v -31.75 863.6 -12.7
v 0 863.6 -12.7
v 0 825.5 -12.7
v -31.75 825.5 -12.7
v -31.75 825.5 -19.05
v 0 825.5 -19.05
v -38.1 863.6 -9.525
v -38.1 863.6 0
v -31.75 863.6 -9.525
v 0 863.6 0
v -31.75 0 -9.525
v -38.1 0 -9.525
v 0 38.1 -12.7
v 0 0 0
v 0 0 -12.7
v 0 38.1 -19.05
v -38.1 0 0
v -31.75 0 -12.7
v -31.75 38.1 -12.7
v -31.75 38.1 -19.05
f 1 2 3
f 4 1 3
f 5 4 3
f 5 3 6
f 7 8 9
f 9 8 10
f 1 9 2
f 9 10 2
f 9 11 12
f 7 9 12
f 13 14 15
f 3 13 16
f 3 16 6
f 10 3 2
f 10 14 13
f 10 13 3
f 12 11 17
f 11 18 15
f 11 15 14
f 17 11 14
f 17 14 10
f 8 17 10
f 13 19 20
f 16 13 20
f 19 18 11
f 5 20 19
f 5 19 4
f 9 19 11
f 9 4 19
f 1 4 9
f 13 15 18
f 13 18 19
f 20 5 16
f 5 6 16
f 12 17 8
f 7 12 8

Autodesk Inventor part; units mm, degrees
ref_plane "YZ Plane" through (0, 0, 0) normal (1, 0, 0) x (0, 1, 0)
ref_plane "XZ Plane" through (0, 0, 0) normal (0, 1, 0) x (-1, 0, 0)
ref_plane "XY Plane" through (0, 0, 0) normal (0, 0, 1) x (1, 0, 0)
sketch "Sketch1" plane through (0, 0, 0) normal (1, 0, 0) x (0, 1, 0)
  line L0 (0, 0) -> (863.6, 0)
  line L1 (863.6, 0) -> (863.6, -19.05)
  line L2 (863.6, -19.05) -> (0, -19.05)
  line L3 (0, -19.05) -> (0, 0)
  dimension "d0" = 863.6
  dimension "d1" = 19.05
extrude "Extrusion1" add sketch "Sketch1" against normal blind 38.1
sketch "Sketch2" plane through (0, 0, 0) normal (1, 0, 0) x (0, 0, -1)
  line L0 (19.05, 0) -> (0, 0) projected
  line L1 (19.05, 0) -> (12.7, 0)
  line L2 (12.7, 0) -> (12.7, 38.1)
  line L3 (12.7, 38.1) -> (19.05, 38.1)
  line L4 (19.05, 38.1) -> (19.05, 0)
  point P0 (12.7, 0)
  dimension "d4" = 6.35
  dimension "d5" = 38.1
extrude "Extrusion2" cut sketch "Sketch2" against normal blind 38.1
sketch "Sketch3" plane through (0, 0, 0) normal (1, 0, 0) x (0, 0, -1)
  line L0 (19.05, 38.1) -> (19.05, 863.6) projected
  line L1 (19.05, 863.6) -> (12.7, 863.6)
  line L2 (12.7, 863.6) -> (12.7, 825.5)
  line L3 (12.7, 825.5) -> (19.05, 825.5)
  line L4 (19.05, 825.5) -> (19.05, 863.6)
  point P0 (0, 0)
  dimension "d8" = 6.35
  dimension "d9" = 38.1
extrude "Extrusion3" cut sketch "Sketch3" against normal blind 38.1
sketch "Sketch4" plane through (0, 38.1, -19.05) normal (0, 0, -1) x (-1, 0, 0)
  line L0 (38.1, -38.1) -> (38.1, 825.5) projected
  line L1 (38.1, 0) -> (38.1, -38.1)
  line L2 (38.1, -38.1) -> (31.75, -38.1)
  line L3 (0, -38.1) -> (38.1, -38.1) projected
  line L4 (31.75, -38.1) -> (31.75, 825.5)
  line L5 (0, 825.5) -> (38.1, 825.5) projected
  line L6 (31.75, 825.5) -> (38.1, 825.5)
  line L7 (38.1, 787.4) -> (38.1, 0) projected
  line L8 (38.1, 825.5) -> (38.1, 0)
  dimension "d16" = 6.35
  dimension "d17" = 863.6
extrude "Extrusion4" cut sketch "Sketch4" against normal blind 9.525
properties part number "sidev2" material "Wood (Cherry)"
